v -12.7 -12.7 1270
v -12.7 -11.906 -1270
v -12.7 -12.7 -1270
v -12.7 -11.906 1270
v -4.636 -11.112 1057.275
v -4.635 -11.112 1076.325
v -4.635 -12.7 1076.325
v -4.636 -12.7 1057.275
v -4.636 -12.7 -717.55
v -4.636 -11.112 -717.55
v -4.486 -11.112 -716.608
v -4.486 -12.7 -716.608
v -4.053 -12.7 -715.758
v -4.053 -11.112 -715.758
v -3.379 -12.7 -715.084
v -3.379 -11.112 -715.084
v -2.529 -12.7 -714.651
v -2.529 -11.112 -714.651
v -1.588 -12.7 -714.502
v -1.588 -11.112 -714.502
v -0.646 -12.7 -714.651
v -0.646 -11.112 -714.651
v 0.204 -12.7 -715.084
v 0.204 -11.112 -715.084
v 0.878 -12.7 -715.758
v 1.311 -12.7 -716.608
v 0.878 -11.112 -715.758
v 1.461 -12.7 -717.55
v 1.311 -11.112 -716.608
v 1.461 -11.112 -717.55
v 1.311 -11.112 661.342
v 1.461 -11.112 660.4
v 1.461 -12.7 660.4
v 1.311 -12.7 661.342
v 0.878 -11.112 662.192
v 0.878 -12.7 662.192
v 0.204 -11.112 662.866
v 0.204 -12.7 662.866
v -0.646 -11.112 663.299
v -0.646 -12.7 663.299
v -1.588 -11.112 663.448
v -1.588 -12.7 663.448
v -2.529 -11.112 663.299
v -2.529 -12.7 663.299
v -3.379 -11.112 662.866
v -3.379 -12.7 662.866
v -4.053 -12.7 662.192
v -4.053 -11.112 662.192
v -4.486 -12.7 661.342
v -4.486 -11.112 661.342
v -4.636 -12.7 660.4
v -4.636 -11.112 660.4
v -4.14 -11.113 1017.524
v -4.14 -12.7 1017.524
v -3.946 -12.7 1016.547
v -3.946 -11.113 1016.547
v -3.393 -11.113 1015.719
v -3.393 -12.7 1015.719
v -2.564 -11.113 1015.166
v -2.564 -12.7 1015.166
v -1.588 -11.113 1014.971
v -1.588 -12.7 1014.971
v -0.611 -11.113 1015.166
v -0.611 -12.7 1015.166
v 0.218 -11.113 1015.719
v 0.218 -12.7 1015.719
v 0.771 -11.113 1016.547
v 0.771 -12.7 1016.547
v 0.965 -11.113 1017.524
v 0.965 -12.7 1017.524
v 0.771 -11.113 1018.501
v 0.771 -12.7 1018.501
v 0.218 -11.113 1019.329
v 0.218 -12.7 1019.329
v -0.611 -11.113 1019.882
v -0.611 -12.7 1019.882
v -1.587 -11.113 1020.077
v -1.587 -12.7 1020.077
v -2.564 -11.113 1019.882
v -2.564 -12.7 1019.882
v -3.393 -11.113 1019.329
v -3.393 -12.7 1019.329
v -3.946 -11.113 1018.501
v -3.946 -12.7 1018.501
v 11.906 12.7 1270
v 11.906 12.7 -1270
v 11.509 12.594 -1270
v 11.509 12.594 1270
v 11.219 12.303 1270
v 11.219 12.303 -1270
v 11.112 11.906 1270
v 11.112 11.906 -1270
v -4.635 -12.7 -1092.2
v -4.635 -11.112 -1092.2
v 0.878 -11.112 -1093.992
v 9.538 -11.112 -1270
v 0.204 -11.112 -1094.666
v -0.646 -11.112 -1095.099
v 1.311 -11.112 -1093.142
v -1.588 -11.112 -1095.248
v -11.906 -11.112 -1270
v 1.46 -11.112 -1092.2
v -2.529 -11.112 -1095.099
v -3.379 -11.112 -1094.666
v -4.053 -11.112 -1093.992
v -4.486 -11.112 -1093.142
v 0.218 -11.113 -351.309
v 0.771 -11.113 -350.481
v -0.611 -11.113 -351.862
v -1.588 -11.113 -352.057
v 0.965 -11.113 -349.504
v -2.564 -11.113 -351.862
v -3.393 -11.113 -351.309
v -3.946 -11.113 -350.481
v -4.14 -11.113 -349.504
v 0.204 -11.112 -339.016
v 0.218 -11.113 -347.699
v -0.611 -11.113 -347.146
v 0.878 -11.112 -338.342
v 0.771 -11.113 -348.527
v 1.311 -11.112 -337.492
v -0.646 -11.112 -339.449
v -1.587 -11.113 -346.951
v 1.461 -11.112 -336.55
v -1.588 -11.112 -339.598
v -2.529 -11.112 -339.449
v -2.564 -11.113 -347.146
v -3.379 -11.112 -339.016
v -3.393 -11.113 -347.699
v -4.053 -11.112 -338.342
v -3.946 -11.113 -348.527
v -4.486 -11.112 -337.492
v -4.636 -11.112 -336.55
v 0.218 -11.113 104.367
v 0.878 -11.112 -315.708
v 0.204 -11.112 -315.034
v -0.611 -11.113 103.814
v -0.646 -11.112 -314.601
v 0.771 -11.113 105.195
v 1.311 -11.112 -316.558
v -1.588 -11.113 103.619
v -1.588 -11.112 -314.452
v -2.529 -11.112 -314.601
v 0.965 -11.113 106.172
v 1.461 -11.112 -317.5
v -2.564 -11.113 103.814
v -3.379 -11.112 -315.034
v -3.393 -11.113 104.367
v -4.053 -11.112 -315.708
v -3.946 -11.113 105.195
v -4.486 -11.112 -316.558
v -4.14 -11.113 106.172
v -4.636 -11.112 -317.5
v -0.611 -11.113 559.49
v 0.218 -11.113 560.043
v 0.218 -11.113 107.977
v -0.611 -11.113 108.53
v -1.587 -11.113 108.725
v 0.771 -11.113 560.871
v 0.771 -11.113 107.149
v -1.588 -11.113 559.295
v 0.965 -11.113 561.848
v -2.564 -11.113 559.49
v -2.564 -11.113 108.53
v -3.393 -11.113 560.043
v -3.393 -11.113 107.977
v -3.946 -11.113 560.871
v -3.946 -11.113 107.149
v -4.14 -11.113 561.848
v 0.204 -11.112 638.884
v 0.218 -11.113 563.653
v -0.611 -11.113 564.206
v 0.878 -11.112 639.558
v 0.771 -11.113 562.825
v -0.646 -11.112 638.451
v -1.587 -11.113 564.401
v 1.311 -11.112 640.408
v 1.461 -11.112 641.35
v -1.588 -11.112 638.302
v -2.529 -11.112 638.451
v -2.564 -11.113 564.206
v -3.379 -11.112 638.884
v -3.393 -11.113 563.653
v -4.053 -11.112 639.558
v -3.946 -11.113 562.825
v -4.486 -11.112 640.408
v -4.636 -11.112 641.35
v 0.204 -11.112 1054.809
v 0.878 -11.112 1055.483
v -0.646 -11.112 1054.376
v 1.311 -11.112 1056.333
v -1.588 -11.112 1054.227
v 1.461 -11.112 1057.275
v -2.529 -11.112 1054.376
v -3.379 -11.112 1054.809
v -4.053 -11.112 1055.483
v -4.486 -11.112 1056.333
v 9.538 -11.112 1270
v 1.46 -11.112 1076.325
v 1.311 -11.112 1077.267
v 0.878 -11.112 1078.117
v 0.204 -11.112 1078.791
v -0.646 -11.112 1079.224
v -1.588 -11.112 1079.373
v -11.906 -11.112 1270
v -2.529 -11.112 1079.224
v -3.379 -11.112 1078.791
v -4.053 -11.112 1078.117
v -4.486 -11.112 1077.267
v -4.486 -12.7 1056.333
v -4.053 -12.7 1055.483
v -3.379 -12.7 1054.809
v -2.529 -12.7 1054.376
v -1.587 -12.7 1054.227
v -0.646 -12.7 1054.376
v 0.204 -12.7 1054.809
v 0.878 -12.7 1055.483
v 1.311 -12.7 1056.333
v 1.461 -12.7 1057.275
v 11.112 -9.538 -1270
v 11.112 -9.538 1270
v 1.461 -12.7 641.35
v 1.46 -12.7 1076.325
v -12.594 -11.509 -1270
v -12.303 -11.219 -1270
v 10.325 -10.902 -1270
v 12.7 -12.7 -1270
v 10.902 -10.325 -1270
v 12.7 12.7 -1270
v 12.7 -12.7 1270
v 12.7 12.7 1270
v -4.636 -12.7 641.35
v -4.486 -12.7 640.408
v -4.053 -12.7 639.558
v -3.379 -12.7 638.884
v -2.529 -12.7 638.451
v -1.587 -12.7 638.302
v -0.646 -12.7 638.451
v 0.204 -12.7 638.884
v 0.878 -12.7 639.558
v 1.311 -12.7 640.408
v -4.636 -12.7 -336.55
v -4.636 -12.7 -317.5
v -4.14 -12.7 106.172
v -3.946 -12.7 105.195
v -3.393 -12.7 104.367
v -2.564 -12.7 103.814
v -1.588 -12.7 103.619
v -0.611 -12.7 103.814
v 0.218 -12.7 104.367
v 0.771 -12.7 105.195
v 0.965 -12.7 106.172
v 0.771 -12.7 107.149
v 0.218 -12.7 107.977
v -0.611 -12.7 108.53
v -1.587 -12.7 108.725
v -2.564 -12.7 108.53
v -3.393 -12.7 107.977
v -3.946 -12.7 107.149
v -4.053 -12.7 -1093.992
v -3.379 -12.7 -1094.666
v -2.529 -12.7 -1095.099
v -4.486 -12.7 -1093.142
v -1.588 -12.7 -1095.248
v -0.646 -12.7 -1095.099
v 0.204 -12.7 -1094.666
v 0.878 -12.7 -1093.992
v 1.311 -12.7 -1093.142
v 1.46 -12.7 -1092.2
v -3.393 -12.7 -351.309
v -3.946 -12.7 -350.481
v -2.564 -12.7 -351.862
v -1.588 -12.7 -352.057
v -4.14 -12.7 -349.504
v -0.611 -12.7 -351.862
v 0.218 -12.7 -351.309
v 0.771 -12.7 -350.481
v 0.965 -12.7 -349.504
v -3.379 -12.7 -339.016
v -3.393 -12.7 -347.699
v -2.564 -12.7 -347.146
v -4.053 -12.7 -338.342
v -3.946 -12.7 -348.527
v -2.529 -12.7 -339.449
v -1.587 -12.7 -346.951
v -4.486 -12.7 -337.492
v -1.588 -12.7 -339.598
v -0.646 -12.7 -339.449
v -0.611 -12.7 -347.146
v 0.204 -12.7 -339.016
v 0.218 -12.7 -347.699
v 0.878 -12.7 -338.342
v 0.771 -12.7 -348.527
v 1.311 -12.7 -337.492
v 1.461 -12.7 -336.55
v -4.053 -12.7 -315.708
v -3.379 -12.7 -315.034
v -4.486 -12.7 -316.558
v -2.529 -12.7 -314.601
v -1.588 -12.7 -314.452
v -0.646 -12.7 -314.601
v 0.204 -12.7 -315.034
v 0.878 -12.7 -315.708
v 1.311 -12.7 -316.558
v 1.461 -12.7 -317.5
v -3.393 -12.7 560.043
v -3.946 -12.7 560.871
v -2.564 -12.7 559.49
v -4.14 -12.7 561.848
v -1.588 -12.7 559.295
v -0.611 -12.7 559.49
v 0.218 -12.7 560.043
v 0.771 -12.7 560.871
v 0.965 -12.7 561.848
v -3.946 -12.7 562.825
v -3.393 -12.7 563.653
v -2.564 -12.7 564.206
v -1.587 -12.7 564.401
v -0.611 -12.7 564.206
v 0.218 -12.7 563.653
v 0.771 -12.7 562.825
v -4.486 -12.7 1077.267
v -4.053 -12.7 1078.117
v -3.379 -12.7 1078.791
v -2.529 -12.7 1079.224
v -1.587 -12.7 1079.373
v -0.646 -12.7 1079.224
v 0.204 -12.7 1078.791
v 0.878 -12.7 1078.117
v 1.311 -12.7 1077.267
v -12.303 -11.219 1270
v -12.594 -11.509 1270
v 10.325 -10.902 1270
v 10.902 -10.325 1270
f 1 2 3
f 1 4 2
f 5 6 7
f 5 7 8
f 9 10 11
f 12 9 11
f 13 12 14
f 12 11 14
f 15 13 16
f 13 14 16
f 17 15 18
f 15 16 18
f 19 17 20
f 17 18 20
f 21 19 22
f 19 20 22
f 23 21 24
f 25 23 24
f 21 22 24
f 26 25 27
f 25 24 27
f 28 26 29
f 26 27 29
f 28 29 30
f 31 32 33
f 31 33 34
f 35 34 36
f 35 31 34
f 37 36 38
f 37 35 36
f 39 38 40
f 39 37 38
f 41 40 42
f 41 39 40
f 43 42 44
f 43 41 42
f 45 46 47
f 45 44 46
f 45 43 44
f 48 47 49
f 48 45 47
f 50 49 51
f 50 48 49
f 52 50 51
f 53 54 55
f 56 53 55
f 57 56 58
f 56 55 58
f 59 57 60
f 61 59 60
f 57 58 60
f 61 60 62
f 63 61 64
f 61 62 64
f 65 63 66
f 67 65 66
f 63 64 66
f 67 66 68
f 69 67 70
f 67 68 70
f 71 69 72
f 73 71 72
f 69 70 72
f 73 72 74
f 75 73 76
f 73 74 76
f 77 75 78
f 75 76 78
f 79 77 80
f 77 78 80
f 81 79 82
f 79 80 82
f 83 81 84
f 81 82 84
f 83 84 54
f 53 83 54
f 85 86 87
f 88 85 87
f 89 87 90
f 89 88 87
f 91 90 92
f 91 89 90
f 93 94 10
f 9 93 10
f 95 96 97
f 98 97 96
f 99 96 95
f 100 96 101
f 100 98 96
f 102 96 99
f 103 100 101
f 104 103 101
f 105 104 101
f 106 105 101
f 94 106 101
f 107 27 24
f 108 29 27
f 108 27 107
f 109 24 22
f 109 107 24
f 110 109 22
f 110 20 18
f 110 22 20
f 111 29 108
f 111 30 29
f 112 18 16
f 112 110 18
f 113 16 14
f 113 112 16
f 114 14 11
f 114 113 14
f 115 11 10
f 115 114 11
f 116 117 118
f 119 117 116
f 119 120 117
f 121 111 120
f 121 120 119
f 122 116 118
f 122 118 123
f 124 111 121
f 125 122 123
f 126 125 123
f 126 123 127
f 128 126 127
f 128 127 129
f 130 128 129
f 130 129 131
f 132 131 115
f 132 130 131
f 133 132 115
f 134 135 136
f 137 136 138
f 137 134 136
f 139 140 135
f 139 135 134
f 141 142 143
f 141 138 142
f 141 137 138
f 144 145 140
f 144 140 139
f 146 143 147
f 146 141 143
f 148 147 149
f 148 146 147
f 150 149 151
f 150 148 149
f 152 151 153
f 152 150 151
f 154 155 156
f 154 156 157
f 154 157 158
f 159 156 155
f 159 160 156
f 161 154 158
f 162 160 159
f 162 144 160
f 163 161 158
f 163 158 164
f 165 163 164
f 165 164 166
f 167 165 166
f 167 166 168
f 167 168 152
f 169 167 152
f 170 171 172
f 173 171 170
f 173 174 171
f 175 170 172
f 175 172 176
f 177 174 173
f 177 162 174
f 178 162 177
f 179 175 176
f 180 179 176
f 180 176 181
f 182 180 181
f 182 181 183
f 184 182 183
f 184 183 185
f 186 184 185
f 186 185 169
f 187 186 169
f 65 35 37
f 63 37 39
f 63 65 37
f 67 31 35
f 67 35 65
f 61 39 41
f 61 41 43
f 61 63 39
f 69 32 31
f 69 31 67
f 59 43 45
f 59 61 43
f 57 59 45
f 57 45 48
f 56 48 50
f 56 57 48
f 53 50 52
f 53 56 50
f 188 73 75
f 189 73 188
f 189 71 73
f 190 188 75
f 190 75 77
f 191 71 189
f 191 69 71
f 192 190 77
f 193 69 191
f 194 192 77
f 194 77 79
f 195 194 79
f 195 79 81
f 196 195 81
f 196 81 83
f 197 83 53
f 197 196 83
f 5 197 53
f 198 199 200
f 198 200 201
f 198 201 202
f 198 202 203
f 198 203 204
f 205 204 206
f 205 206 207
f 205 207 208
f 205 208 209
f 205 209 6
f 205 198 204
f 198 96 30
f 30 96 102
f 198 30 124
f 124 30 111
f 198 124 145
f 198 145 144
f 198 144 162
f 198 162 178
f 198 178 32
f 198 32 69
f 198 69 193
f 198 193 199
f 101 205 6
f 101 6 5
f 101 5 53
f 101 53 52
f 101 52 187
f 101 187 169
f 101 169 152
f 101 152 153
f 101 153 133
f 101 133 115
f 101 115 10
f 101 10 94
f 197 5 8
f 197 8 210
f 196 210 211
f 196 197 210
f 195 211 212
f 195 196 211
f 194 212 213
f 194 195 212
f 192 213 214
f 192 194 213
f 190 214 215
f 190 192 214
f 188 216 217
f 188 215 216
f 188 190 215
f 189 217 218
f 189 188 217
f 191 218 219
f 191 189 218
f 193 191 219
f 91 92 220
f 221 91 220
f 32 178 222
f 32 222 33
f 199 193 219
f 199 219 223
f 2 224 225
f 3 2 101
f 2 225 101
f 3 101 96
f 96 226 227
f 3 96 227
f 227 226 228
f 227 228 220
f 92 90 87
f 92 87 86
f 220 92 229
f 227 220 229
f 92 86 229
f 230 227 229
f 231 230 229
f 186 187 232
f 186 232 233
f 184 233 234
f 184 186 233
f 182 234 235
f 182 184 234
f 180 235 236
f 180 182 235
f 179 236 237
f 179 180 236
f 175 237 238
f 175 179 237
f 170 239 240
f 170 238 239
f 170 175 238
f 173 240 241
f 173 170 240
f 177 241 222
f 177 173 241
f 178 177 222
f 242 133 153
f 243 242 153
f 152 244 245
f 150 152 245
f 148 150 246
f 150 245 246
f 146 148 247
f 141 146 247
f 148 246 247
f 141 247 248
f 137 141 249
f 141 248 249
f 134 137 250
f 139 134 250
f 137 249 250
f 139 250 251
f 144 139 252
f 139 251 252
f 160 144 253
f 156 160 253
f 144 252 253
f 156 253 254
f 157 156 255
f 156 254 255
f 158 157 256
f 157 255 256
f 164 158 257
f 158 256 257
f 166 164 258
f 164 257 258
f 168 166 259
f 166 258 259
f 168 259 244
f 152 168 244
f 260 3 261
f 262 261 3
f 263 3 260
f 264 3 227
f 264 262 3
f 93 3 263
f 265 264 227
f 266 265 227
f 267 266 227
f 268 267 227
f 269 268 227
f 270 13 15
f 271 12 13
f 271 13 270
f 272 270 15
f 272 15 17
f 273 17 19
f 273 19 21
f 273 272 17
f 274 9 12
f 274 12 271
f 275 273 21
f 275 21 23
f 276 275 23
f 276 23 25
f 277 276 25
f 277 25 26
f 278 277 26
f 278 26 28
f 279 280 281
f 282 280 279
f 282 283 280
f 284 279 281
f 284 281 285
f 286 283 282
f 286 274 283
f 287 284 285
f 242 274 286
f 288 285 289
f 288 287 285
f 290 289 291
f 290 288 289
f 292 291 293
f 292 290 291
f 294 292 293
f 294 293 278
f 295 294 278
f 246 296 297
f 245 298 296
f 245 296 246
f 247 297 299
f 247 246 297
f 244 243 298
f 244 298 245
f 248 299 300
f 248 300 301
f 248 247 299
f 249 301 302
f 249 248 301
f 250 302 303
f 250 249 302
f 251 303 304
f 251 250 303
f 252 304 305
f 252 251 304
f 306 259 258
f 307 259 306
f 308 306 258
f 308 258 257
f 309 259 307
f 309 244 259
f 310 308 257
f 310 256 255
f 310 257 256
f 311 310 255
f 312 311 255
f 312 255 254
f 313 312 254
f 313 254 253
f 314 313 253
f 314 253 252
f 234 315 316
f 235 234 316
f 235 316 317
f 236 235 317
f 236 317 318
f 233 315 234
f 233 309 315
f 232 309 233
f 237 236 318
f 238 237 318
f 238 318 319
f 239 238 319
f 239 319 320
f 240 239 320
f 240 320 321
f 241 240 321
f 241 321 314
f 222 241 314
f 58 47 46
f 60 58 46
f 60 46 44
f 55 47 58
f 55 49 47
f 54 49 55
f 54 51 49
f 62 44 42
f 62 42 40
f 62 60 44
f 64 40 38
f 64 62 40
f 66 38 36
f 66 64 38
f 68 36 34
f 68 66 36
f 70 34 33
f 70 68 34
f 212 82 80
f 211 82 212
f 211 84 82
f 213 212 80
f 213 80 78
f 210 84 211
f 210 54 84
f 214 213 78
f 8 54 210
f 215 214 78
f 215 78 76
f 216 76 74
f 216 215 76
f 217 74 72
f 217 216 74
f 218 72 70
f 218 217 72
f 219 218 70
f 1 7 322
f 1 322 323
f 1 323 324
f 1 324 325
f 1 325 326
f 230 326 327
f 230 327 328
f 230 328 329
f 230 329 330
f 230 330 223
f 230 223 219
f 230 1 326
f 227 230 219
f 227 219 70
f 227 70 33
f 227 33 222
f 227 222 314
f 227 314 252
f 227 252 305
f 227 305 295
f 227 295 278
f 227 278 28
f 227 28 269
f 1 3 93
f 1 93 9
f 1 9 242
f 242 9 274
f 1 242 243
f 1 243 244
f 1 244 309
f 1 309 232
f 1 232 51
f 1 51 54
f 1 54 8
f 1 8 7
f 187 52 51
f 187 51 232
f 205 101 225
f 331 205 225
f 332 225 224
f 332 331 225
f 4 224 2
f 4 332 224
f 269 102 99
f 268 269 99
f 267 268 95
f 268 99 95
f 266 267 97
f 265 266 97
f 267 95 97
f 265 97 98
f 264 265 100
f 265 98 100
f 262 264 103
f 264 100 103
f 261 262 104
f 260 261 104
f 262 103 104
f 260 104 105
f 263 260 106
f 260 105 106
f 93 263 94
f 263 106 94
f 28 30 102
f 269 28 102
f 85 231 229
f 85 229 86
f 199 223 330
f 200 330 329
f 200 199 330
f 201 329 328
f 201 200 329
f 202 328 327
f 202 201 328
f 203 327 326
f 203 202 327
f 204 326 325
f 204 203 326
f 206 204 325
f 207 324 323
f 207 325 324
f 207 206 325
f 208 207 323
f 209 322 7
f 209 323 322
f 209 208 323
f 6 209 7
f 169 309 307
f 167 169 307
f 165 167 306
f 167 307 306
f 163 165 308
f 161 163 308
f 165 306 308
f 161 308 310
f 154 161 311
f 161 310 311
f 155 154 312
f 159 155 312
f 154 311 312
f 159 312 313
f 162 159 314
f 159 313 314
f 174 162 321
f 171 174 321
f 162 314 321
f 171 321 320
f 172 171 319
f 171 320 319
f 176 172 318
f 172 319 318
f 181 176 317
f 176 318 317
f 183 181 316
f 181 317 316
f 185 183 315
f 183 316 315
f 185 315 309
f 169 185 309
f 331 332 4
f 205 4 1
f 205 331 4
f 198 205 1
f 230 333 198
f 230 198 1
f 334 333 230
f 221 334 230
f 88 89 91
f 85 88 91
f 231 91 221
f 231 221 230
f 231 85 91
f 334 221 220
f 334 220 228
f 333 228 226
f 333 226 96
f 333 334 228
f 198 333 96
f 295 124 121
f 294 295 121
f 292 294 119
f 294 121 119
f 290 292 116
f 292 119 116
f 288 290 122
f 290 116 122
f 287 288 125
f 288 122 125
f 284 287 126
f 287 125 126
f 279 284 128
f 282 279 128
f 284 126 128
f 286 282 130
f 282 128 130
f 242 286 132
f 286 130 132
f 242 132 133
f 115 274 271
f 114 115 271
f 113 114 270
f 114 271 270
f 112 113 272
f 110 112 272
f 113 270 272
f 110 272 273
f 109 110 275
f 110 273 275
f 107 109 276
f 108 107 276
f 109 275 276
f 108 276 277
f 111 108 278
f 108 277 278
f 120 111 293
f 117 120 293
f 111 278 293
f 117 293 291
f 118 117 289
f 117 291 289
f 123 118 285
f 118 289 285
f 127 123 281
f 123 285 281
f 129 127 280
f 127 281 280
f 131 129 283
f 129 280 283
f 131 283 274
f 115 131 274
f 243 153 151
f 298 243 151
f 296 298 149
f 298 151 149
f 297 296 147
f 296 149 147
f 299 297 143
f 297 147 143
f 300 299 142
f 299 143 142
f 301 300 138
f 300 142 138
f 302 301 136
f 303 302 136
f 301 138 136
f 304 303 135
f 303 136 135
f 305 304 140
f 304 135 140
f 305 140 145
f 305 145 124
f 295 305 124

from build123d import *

# Parameters (mm, degrees)
BOSS_EXTRUDE1_DEPTH     = 1270
F_1_4_20_TAPPED_HOLE1_D = 5.1054
CUT_EXTRUDE1_DEPTH      = 2.5875


with BuildPart() as part:
    # Sketch2 → Boss-Extrude1 (new body, symmetric)
    with BuildSketch(Plane.XY):
        with BuildLine():
            Line((-12.7, -12.7), (12.7, -12.7))
            Line((12.7, -12.7), (12.7, 12.7))
            Line((12.7, 12.7), (11.90625, 12.7))
            ThreePointArc((11.90625, 12.7), (11.344983992, 12.467516008), (11.1125, 11.90625))
            Line((11.1125, 11.90625), (11.1125, -9.5377))
            ThreePointArc((11.1125, -9.5377), (10.651251759, -10.651251759), (9.5377, -11.1125))
            Line((9.5377, -11.1125), (-11.90625, -11.1125))
            ThreePointArc((-11.90625, -11.1125), (-12.467516008, -11.344983992), (-12.7, -11.90625))
            Line((-12.7, -11.90625), (-12.7, -12.7))
        make_face()
    extrude(amount=BOSS_EXTRUDE1_DEPTH, both=True)

    # 1/4-20 Tapped Hole1 (through all)
    with Locations(Plane(origin=(0, -11.1125, 0), x_dir=(1, 0, 0), z_dir=(0, 1, 0))):
        with Locations((-1.5875, -1017.524), (-1.5875, -561.848), (-1.5875, 349.504), (-1.5875, -106.172)):
            Hole(F_1_4_20_TAPPED_HOLE1_D / 2)

    # Sketch5 → Cut-Extrude1 (cut, through all)
    with BuildSketch(Plane(origin=(0, -11.1125, 0), x_dir=(1, 0, 0), z_dir=(0, 1, 0))):
        with BuildLine():
            Line((1.4605, -1057.275), (1.4605, -1076.325))
            ThreePointArc((1.4605, -1076.325), (-1.5875, -1079.373), (-4.6355, -1076.325))
            Line((-4.6355, -1076.325), (-4.6355, -1057.275))
            ThreePointArc((-4.6355, -1057.275), (-1.5875, -1054.227), (1.4605, -1057.275))
        make_face()
        with BuildLine():
            Line((1.4605, -641.35), (1.4605, -660.4))
            ThreePointArc((1.4605, -660.4), (-1.5875, -663.448), (-4.6355, -660.4))
            Line((-4.6355, -660.4), (-4.6355, -641.35))
            ThreePointArc((-4.6355, -641.35), (-1.5875, -638.302), (1.4605, -641.35))
        make_face()
        with BuildLine():
            Line((1.4605, 317.5), (1.4605, 336.55))
            ThreePointArc((1.4605, 336.55), (-1.5875, 339.598), (-4.6355, 336.55))
            Line((-4.6355, 336.55), (-4.6355, 317.5))
            ThreePointArc((-4.6355, 317.5), (-1.5875, 314.452), (1.4605, 317.5))
        make_face()
        with BuildLine():
            Line((1.4605, 717.55), (1.4605, 1092.2))
            ThreePointArc((1.4605, 1092.2), (-1.5875, 1095.248), (-4.6355, 1092.2))
            Line((-4.6355, 1092.2), (-4.6355, 717.55))
            ThreePointArc((-4.6355, 717.55), (-1.5875, 714.502), (1.4605, 717.55))
        make_face()
    extrude(amount=-CUT_EXTRUDE1_DEPTH, mode=Mode.SUBTRACT)


solid = part.part
